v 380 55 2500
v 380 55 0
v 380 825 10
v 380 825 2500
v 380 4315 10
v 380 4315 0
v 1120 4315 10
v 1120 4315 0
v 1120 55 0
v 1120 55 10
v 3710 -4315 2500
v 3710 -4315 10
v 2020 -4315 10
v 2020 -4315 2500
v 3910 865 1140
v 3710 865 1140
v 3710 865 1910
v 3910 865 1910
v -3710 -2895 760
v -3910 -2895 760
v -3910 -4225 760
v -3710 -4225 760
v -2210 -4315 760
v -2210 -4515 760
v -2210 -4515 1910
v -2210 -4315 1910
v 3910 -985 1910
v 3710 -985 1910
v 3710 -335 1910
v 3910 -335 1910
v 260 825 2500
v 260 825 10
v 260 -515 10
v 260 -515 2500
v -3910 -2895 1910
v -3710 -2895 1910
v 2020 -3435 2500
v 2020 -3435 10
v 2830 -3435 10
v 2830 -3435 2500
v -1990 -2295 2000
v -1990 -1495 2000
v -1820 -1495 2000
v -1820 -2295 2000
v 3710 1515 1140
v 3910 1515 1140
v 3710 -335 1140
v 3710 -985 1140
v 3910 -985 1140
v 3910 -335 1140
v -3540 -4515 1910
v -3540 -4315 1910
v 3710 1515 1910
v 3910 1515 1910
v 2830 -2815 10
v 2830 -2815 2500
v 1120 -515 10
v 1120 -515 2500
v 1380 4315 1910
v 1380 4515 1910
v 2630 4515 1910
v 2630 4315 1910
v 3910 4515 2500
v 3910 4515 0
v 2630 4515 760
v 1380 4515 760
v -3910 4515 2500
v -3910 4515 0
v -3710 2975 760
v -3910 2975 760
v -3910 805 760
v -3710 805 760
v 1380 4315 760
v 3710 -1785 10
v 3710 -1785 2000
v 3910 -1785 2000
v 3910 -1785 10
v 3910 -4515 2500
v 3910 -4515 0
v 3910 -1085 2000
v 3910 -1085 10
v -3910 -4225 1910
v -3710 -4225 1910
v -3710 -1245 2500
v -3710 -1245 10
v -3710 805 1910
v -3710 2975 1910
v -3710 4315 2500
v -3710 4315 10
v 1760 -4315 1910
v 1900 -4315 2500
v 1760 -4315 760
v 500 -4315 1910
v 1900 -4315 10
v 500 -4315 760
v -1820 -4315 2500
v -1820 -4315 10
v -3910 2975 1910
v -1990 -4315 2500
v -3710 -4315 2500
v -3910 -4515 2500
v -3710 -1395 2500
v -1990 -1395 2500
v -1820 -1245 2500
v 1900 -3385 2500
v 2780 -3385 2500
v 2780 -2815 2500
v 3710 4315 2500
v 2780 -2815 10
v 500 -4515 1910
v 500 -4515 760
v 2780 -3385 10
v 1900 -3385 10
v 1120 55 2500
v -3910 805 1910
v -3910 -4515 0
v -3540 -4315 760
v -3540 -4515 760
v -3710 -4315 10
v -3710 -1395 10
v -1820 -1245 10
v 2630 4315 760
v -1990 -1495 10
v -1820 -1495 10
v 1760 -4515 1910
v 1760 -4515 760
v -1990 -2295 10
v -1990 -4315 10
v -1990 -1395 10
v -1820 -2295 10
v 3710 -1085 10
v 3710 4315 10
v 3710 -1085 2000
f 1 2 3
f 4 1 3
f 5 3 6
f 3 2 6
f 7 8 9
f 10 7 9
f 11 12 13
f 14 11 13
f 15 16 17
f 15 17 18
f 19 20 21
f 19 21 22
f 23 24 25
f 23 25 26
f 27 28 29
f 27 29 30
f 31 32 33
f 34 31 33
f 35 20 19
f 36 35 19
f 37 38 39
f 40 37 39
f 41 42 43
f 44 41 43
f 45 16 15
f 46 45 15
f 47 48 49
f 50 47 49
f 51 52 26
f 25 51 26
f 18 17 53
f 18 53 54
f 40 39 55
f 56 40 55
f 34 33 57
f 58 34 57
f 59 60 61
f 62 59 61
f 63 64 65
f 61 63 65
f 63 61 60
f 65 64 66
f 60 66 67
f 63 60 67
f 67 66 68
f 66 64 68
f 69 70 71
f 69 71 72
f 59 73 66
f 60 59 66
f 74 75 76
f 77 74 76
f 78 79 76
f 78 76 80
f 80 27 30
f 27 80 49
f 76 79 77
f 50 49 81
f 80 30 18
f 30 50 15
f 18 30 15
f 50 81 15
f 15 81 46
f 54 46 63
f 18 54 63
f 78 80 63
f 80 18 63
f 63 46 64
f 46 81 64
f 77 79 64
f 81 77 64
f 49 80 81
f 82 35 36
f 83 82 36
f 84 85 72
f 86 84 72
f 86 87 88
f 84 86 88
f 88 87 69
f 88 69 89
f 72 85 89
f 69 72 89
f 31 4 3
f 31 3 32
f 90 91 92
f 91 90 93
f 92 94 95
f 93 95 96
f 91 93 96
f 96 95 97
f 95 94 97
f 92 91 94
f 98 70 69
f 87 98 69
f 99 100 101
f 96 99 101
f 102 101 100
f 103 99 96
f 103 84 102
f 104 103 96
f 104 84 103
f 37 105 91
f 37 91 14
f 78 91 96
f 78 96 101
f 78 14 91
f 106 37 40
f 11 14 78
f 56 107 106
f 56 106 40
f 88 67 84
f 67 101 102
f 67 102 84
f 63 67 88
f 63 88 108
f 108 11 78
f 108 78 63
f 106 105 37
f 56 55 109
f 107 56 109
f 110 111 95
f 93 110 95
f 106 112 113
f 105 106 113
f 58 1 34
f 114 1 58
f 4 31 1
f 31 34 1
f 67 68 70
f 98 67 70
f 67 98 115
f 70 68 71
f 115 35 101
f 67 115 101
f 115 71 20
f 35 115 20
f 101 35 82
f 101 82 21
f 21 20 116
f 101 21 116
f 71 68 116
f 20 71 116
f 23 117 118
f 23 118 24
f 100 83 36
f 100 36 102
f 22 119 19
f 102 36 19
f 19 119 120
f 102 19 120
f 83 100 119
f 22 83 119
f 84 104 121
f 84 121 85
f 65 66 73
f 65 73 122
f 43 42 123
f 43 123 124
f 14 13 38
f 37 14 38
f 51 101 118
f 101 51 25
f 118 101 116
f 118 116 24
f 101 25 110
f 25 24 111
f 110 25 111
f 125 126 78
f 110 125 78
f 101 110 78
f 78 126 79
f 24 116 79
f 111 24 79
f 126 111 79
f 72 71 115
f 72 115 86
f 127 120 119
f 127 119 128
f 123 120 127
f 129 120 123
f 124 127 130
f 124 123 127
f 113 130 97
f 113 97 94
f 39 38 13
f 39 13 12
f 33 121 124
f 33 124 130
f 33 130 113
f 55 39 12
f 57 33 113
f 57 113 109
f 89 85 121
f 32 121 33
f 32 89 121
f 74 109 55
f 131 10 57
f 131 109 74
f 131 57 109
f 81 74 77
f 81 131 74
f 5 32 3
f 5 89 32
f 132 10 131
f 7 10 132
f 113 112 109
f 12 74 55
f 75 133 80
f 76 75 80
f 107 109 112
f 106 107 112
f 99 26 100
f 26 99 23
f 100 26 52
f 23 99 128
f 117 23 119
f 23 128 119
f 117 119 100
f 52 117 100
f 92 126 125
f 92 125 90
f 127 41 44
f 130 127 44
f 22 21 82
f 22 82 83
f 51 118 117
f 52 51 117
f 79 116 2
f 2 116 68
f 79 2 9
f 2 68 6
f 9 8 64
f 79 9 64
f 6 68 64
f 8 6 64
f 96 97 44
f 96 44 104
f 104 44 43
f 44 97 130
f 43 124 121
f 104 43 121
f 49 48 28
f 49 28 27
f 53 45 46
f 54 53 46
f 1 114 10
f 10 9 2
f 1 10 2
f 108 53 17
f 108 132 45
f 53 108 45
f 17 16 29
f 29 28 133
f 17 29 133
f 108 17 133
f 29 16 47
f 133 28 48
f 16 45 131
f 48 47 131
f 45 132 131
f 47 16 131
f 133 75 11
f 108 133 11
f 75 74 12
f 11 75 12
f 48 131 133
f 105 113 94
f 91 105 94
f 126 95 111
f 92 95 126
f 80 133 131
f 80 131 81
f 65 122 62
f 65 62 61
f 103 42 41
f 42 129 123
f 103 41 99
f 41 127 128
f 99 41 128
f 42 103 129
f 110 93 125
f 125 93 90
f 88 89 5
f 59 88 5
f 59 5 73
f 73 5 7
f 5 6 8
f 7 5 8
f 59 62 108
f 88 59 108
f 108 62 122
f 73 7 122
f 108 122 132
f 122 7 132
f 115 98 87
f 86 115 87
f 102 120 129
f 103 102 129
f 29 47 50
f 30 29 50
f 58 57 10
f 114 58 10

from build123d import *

# Parameters (mm, degrees)
F0_W     = 820
F0_H     = 120
F0_W_2   = 170
F0_H_2   = 800
F0_W_3   = 120
F0_H_3   = 820
F0_H_4   = 110
F0_W_4   = 200
F0_H_5   = 700
F0_W_5   = 880
F0_H_6   = 310
F0_W_6   = 405
F0_H_7   = 880
F0_W_7   = 770
F0_W_8   = 780
F0_H_8   = 100
F0_W_9   = 1000
F0_H_9   = 2670
F0_H_10  = 2020
F0_W_10  = 50
F0_H_11  = 650
F0_H_12  = 250
F0_W_11  = 100
F0_H_13  = 600
F0_H_14  = 20
F1_DEPTH = 10
F0_W_12  = 1250
F0_H_15  = 200
F0_W_13  = 1260
F0_W_14  = 1330
F0_H_16  = 1330
F0_H_17  = 2170
F2_DEPTH = 2500
F3_START = 10
F3_DEPTH = 1990
F4_START = 760
F4_DEPTH = 1150
F5_START = 1140
F5_DEPTH = 770


with BuildPart() as f1:
    # F0 (on Top) → F1 (new body)
    with BuildSketch(Plane.XY):
        Polygon((-740, -395), (260, -395), (260, 825), (260, 1645), (260, 4315), (-3710, 4315), (-3710, 2975), (-3710, 805), (-3710, -395), (-1560, -395), align=None)
        with Locations((-1150, -455)):
            Rectangle(F0_W, F0_H)
        Polygon((-3710, -1245), (-1920, -1245), (-1920, -1135), (-1920, -535), (-1920, -515), (-3710, -515), align=None)
        Polygon((1760, -4315), (1900, -4315), (1900, -3385), (1900, -1365), (1900, -545), (1900, -515), (1120, -515), (380, -515), (260, -515), (-740, -515), (-1560, -515), (-1820, -515), (-1820, -535), (-1820, -1135), (-1820, -1245), (-1820, -1495), (-1820, -2295), (-1820, -4315), (500, -4315), align=None)
        with Locations((-1905, -1895)):
            Rectangle(F0_W_2, F0_H_2)
        Polygon((-2210, -4315), (-1990, -4315), (-1990, -2295), (-1990, -1495), (-1990, -1395), (-3710, -1395), (-3710, -2895), (-3710, -4225), (-3710, -4315), (-3540, -4315), align=None)
        with Locations((1960, -955)):
            Rectangle(F0_W_3, F0_H_3)
        Polygon((2830, -2565), (2830, -2815), (3710, -2815), (3710, -1785), (3710, -1085), (3710, -985), (3710, -335), (3710, -55), (2940, -55), (2120, -55), (2020, -55), (2020, -515), (2020, -545), (2020, -1365), (2020, -1855), (2830, -1855), (2830, -1915), align=None)
        Polygon((2780, -3385), (2780, -2815), (2780, -2565), (2780, -1915), (2780, -1905), (2020, -1905), (2020, -3385), align=None)
        with Locations((2530, 0)):
            Rectangle(F0_W, F0_H_4)
        with Locations((3810, -1435)):
            Rectangle(F0_W_4, F0_H_5)
        Polygon((1120, -415), (1900, -415), (1900, 55), (2120, 55), (2940, 55), (3710, 55), (3710, 865), (3710, 1515), (3710, 4315), (2630, 4315), (1380, 4315), (1120, 4315), (1120, 55), align=None)
        with Locations((320, 1235)):
            Rectangle(F0_W_3, F0_H_3)
        with Locations((3270, -2970)):
            Rectangle(F0_W_5, F0_H_6)
        with Locations((3270, -3280)):
            Rectangle(F0_W_5, F0_H_6)
        Polygon((2830, -3435), (3710, -3799.5079348883), (3710, -3435), align=None)
        Polygon((2830, -3435), (3710, -4315), (3710, -3799.5079348883), align=None)
        Polygon((3194.5079348883, -4315), (3710, -4315), (2830, -3435), align=None)
        Polygon((2830, -4315), (3194.5079348883, -4315), (2830, -3435), align=None)
        with Locations((2627.5, -3875)):
            Rectangle(F0_W_6, F0_H_7)
        with Locations((2222.5, -3875)):
            Rectangle(F0_W_6, F0_H_7)
        Polygon((1900, -3385), (2020, -3385), (2020, -1905), (2020, -1855), (2020, -1365), (1900, -1365), align=None)
        with Locations((3325, 0)):
            Rectangle(F0_W_7, F0_H_4)
        Polygon((2020, -4315), (2020, -3435), (2020, -3385), (1900, -3385), (1900, -4315), align=None)
        Polygon((1900, -515), (1900, -545), (2020, -545), (2020, -515), (2020, -55), (2120, -55), (2120, 55), (1900, 55), (1900, -415), align=None)
        with Locations((1510, -465)):
            Rectangle(F0_W_8, F0_H_8)
        Polygon((380, -515), (1120, -515), (1120, -415), (1120, 55), (380, 55), align=None)
        Polygon((260, -515), (380, -515), (380, 55), (380, 825), (260, 825), (260, -395), align=None)
        with Locations((-240, -455)):
            Rectangle(F0_W_9, F0_H)
        with Locations((320, 2980)):
            Rectangle(F0_W_3, F0_H_9)
        with Locations((-1905, -3305)):
            Rectangle(F0_W_2, F0_H_10)
        Polygon((2780, -1915), (2830, -1915), (2830, -1855), (2020, -1855), (2020, -1905), (2780, -1905), align=None)
        with Locations((2805, -2240)):
            Rectangle(F0_W_10, F0_H_11)
        with Locations((2805, -2690)):
            Rectangle(F0_W_10, F0_H_12)
        Polygon((2425, -3435), (2830, -3435), (2830, -3125), (2830, -2815), (2780, -2815), (2780, -3385), (2020, -3385), (2020, -3435), align=None)
        Polygon((-1990, -1495), (-1820, -1495), (-1820, -1245), (-1920, -1245), (-3710, -1245), (-3710, -1395), (-1990, -1395), align=None)
        with Locations((-1870, -1190)):
            Rectangle(F0_W_11, F0_H_4)
        with Locations((-1870, -835)):
            Rectangle(F0_W_11, F0_H_13)
        with Locations((-1870, -525)):
            Rectangle(F0_W_11, F0_H_14)
        Polygon((-1820, -515), (-1560, -515), (-1560, -395), (-3710, -395), (-3710, -515), (-1920, -515), align=None)
    extrude(amount=F1_DEPTH)

    # F0 (on Top) → F2 (join)
    with BuildSketch(Plane.XY):
        Polygon((380, 4315), (1120, 4315), (1380, 4315), (1380, 4515), (-3910, 4515), (-3910, 2975), (-3710, 2975), (-3710, 4315), (260, 4315), align=None)
        with Locations((2005, 4415)):
            Rectangle(F0_W_12, F0_H_15)
        Polygon((3710, 1515), (3910, 1515), (3910, 4515), (2630, 4515), (2630, 4315), (3710, 4315), align=None)
        with Locations((3810, 1190)):
            Rectangle(F0_W_4, F0_H_11)
        Polygon((3710, -55), (3710, -335), (3910, -335), (3910, 865), (3710, 865), (3710, 55), align=None)
        with Locations((3810, -660)):
            Rectangle(F0_W_4, F0_H_11)
        with Locations((3810, -1035)):
            Rectangle(F0_W_4, F0_H_8)
        with Locations((3810, -1435)):
            Rectangle(F0_W_4, F0_H_5)
        Polygon((3710, -3799.5079348883), (3710, -4315), (3194.5079348883, -4315), (2830, -4315), (2425, -4315), (2020, -4315), (1900, -4315), (1760, -4315), (1760, -4515), (3910, -4515), (3910, -1785), (3710, -1785), (3710, -2815), (3710, -3125), (3710, -3435), align=None)
        with Locations((1130, -4415)):
            Rectangle(F0_W_13, F0_H_15)
        Polygon((500, -4515), (500, -4315), (-1820, -4315), (-1990, -4315), (-2210, -4315), (-2210, -4515), align=None)
        with Locations((-2875, -4415)):
            Rectangle(F0_W_14, F0_H_15)
        Polygon((-3910, -4515), (-3540, -4515), (-3540, -4315), (-3710, -4315), (-3710, -4225), (-3910, -4225), align=None)
        with Locations((-3810, -3560)):
            Rectangle(F0_W_4, F0_H_16)
        Polygon((-3710, -2895), (-3710, -1395), (-3710, -1245), (-3710, -515), (-3710, -395), (-3710, 805), (-3910, 805), (-3910, -2895), align=None)
        with Locations((-3810, 1890)):
            Rectangle(F0_W_4, F0_H_17)
        Polygon((380, -515), (1120, -515), (1120, -415), (1120, 55), (380, 55), align=None)
        with Locations((-1905, -3305)):
            Rectangle(F0_W_2, F0_H_10)
        with Locations((-1905, -1895)):
            Rectangle(F0_W_2, F0_H_2)
        Polygon((-1990, -1495), (-1820, -1495), (-1820, -1245), (-1920, -1245), (-3710, -1245), (-3710, -1395), (-1990, -1395), align=None)
        Polygon((2020, -4315), (2020, -3435), (2020, -3385), (1900, -3385), (1900, -4315), align=None)
        Polygon((2425, -3435), (2830, -3435), (2830, -3125), (2830, -2815), (2780, -2815), (2780, -3385), (2020, -3385), (2020, -3435), align=None)
        Polygon((260, -515), (380, -515), (380, 55), (380, 825), (260, 825), (260, -395), align=None)
    extrude(amount=F2_DEPTH)

    # F0 (on Top) → F3 (cut)
    with BuildSketch(Plane.XY.offset(F3_START)):
        with Locations((2530, 0)):
            Rectangle(F0_W, F0_H_4)
        with Locations((1960, -955)):
            Rectangle(F0_W_3, F0_H_3)
        with Locations((320, 1235)):
            Rectangle(F0_W_3, F0_H_3)
        with Locations((-1150, -455)):
            Rectangle(F0_W, F0_H)
        with Locations((-1870, -835)):
            Rectangle(F0_W_11, F0_H_13)
        with Locations((-1905, -1895)):
            Rectangle(F0_W_2, F0_H_2)
        with Locations((3810, -1435)):
            Rectangle(F0_W_4, F0_H_5)
        with Locations((2805, -2240)):
            Rectangle(F0_W_10, F0_H_11)
    extrude(amount=F3_DEPTH, mode=Mode.SUBTRACT)

    # F0 (on Top) → F4 (cut)
    with BuildSketch(Plane.XY.offset(F4_START)):
        with Locations((2005, 4415)):
            Rectangle(F0_W_12, F0_H_15)
        with Locations((-3810, 1890)):
            Rectangle(F0_W_4, F0_H_17)
        with Locations((-3810, -3560)):
            Rectangle(F0_W_4, F0_H_16)
        with Locations((-2875, -4415)):
            Rectangle(F0_W_14, F0_H_15)
        with Locations((1130, -4415)):
            Rectangle(F0_W_13, F0_H_15)
    extrude(amount=F4_DEPTH, mode=Mode.SUBTRACT)

    # F0 (on Top) → F5 (cut)
    with BuildSketch(Plane.XY.offset(F5_START)):
        with Locations((3810, 1190)):
            Rectangle(F0_W_4, F0_H_11)
        with Locations((3810, -660)):
            Rectangle(F0_W_4, F0_H_11)
    extrude(amount=F5_DEPTH, mode=Mode.SUBTRACT)


solid = f1.part
